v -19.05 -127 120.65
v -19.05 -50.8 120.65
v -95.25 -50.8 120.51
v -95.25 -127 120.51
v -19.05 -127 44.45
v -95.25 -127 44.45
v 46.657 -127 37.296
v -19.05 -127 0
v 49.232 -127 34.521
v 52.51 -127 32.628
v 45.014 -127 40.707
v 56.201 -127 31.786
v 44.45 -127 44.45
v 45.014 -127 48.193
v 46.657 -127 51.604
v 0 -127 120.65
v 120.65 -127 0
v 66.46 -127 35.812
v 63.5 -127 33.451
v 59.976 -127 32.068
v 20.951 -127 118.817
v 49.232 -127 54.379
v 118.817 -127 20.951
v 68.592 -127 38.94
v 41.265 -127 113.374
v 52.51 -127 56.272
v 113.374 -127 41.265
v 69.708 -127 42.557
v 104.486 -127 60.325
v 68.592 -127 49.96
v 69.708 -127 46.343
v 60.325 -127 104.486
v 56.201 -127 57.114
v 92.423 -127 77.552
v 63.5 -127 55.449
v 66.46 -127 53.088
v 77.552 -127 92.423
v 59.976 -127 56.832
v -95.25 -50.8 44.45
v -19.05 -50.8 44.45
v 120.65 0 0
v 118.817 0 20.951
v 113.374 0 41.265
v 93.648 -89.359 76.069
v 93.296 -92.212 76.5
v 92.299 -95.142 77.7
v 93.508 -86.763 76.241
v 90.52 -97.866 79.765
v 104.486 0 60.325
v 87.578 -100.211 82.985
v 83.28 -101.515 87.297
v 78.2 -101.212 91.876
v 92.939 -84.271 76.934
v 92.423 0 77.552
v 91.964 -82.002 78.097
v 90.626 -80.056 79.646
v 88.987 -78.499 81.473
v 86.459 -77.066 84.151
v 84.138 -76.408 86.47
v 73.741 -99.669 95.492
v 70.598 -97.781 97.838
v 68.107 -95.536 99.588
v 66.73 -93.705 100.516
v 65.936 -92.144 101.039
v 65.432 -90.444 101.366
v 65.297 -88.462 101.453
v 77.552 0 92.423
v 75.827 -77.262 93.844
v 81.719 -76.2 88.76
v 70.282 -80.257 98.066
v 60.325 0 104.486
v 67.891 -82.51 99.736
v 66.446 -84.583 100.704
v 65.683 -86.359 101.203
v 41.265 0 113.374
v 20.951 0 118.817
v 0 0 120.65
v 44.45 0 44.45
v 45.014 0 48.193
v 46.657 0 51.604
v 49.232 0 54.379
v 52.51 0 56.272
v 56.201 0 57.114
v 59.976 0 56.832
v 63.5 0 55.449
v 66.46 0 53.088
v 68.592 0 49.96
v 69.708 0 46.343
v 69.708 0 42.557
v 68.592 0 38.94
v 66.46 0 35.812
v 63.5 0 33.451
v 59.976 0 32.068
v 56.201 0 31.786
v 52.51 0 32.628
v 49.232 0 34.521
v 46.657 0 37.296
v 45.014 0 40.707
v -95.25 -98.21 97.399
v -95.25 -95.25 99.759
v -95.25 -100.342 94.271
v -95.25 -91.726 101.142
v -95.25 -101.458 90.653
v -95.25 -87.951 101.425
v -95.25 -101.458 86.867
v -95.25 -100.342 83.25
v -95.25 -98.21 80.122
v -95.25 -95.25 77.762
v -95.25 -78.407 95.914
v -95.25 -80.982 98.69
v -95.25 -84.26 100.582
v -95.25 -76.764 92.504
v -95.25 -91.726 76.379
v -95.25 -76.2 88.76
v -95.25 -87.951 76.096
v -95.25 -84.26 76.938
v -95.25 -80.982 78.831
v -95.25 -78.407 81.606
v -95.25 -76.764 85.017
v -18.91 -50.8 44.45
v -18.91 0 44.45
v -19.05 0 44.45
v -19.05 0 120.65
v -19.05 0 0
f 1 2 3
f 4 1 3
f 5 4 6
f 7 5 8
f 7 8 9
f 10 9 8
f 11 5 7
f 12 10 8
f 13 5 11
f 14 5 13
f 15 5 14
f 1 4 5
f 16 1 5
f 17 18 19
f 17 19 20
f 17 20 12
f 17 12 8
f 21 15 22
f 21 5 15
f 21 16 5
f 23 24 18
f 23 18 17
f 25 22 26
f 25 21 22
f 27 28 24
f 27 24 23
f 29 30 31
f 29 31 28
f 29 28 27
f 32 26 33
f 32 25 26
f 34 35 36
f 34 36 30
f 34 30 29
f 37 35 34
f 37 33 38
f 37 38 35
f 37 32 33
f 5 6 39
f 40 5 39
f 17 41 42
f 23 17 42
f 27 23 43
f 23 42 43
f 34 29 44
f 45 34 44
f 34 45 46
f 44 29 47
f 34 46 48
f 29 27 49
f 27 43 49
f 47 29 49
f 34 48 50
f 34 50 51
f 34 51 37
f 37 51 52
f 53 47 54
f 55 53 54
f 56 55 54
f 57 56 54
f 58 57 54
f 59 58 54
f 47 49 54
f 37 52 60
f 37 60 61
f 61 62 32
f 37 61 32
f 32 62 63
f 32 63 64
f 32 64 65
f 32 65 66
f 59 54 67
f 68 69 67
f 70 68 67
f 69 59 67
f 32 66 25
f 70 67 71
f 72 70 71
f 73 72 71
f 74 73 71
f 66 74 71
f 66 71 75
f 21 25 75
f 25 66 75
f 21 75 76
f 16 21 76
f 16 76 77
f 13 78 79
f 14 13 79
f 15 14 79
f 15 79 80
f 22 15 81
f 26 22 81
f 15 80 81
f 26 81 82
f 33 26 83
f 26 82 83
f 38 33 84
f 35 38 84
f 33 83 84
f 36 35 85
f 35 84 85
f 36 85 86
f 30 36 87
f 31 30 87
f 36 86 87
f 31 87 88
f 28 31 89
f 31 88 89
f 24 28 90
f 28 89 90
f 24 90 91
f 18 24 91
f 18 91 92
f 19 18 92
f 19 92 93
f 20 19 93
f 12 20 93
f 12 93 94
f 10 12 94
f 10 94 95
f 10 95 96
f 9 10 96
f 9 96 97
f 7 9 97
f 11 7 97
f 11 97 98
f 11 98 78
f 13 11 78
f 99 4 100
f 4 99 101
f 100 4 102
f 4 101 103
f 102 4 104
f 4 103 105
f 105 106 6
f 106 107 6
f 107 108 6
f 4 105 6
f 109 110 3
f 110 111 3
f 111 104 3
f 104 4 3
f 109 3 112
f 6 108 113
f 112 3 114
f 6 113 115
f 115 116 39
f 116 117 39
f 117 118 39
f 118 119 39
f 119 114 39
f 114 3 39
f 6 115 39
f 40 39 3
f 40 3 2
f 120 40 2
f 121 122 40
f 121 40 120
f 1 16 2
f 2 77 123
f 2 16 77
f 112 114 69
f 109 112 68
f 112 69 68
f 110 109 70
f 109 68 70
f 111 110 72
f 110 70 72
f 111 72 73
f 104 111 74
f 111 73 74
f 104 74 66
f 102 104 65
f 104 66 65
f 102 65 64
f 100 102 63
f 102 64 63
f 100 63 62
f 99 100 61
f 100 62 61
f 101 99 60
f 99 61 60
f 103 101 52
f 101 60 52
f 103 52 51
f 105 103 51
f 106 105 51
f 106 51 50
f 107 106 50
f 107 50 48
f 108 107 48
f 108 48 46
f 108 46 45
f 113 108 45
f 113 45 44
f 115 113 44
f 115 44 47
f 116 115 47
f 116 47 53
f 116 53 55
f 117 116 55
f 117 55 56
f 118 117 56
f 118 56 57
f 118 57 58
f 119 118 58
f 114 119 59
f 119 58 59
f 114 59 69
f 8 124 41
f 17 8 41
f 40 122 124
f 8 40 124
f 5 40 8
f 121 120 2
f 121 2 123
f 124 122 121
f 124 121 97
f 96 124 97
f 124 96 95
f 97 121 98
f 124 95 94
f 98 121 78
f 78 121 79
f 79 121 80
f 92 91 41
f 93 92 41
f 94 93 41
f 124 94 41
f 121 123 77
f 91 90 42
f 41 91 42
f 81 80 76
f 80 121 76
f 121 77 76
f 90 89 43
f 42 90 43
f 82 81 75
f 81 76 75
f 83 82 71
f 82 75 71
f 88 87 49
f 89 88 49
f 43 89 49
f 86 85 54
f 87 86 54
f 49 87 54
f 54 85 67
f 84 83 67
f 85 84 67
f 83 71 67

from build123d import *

# Parameters (mm, degrees)
F1_DEPTH = 127
F3_DEPTH = 76.2
F4_W     = 76.2001280264
F4_H     = 50.8
F5_DEPTH = 76.2
F7_D     = 25.4
F9_D     = 25.4


with BuildPart() as f1:
    # F0 (on Front) → F1 (new body)
    with BuildSketch(Plane.XZ):
        Polygon((0, 0), (0, 120.65), (-19.05, 120.65), (-95.25, 120.5103173852), (-95.25, 0), (-19.05, 0), align=None)
        with BuildLine():
            ThreePointArc((120.65, 0), (85.3124331502, 85.3124331502), (0, 120.65))
            Line((0, 120.65), (0, 0))
            Line((0, 0), (120.65, 0))
        make_face()
    extrude(amount=F1_DEPTH)

    # F2 (on face) → F3 (cut)
    with BuildSketch(Plane(origin=(-95.25, 0, 0), x_dir=(0, -1, 0), z_dir=(-1, 0, 0))):
        Polygon((50.8, 44.45), (50.8, 120.5103173852), (0, 120.5103173852), (0, 0), (127, 0), (127, 44.45), align=None)
    extrude(amount=-F3_DEPTH, mode=Mode.SUBTRACT)

    # F4 (on face) → F5 (cut)
    with BuildSketch(Plane(origin=(-0.22122741, 0, 120.6845151206), x_dir=(0.9999983199, 0, 0.0018331021), z_dir=(-0.0018331021, 0, 0.9999983199))):
        with Locations((-56.9288682381, -25.4)):
            Rectangle(F4_W, F4_H)
    extrude(amount=-F5_DEPTH, mode=Mode.SUBTRACT)

    # F7 (through all)
    with Locations(Plane(origin=(-95.25, 0, 0), x_dir=(0, -1, 0), z_dir=(-1, 0, 0))):
        with Locations((88.9, 88.7603173852)):
            Hole(F7_D / 2)

    # F9 (through all)
    with Locations(Plane.XZ.offset(127)):
        with Locations((57.15, 44.45)):
            Hole(F9_D / 2)


solid = f1.part
